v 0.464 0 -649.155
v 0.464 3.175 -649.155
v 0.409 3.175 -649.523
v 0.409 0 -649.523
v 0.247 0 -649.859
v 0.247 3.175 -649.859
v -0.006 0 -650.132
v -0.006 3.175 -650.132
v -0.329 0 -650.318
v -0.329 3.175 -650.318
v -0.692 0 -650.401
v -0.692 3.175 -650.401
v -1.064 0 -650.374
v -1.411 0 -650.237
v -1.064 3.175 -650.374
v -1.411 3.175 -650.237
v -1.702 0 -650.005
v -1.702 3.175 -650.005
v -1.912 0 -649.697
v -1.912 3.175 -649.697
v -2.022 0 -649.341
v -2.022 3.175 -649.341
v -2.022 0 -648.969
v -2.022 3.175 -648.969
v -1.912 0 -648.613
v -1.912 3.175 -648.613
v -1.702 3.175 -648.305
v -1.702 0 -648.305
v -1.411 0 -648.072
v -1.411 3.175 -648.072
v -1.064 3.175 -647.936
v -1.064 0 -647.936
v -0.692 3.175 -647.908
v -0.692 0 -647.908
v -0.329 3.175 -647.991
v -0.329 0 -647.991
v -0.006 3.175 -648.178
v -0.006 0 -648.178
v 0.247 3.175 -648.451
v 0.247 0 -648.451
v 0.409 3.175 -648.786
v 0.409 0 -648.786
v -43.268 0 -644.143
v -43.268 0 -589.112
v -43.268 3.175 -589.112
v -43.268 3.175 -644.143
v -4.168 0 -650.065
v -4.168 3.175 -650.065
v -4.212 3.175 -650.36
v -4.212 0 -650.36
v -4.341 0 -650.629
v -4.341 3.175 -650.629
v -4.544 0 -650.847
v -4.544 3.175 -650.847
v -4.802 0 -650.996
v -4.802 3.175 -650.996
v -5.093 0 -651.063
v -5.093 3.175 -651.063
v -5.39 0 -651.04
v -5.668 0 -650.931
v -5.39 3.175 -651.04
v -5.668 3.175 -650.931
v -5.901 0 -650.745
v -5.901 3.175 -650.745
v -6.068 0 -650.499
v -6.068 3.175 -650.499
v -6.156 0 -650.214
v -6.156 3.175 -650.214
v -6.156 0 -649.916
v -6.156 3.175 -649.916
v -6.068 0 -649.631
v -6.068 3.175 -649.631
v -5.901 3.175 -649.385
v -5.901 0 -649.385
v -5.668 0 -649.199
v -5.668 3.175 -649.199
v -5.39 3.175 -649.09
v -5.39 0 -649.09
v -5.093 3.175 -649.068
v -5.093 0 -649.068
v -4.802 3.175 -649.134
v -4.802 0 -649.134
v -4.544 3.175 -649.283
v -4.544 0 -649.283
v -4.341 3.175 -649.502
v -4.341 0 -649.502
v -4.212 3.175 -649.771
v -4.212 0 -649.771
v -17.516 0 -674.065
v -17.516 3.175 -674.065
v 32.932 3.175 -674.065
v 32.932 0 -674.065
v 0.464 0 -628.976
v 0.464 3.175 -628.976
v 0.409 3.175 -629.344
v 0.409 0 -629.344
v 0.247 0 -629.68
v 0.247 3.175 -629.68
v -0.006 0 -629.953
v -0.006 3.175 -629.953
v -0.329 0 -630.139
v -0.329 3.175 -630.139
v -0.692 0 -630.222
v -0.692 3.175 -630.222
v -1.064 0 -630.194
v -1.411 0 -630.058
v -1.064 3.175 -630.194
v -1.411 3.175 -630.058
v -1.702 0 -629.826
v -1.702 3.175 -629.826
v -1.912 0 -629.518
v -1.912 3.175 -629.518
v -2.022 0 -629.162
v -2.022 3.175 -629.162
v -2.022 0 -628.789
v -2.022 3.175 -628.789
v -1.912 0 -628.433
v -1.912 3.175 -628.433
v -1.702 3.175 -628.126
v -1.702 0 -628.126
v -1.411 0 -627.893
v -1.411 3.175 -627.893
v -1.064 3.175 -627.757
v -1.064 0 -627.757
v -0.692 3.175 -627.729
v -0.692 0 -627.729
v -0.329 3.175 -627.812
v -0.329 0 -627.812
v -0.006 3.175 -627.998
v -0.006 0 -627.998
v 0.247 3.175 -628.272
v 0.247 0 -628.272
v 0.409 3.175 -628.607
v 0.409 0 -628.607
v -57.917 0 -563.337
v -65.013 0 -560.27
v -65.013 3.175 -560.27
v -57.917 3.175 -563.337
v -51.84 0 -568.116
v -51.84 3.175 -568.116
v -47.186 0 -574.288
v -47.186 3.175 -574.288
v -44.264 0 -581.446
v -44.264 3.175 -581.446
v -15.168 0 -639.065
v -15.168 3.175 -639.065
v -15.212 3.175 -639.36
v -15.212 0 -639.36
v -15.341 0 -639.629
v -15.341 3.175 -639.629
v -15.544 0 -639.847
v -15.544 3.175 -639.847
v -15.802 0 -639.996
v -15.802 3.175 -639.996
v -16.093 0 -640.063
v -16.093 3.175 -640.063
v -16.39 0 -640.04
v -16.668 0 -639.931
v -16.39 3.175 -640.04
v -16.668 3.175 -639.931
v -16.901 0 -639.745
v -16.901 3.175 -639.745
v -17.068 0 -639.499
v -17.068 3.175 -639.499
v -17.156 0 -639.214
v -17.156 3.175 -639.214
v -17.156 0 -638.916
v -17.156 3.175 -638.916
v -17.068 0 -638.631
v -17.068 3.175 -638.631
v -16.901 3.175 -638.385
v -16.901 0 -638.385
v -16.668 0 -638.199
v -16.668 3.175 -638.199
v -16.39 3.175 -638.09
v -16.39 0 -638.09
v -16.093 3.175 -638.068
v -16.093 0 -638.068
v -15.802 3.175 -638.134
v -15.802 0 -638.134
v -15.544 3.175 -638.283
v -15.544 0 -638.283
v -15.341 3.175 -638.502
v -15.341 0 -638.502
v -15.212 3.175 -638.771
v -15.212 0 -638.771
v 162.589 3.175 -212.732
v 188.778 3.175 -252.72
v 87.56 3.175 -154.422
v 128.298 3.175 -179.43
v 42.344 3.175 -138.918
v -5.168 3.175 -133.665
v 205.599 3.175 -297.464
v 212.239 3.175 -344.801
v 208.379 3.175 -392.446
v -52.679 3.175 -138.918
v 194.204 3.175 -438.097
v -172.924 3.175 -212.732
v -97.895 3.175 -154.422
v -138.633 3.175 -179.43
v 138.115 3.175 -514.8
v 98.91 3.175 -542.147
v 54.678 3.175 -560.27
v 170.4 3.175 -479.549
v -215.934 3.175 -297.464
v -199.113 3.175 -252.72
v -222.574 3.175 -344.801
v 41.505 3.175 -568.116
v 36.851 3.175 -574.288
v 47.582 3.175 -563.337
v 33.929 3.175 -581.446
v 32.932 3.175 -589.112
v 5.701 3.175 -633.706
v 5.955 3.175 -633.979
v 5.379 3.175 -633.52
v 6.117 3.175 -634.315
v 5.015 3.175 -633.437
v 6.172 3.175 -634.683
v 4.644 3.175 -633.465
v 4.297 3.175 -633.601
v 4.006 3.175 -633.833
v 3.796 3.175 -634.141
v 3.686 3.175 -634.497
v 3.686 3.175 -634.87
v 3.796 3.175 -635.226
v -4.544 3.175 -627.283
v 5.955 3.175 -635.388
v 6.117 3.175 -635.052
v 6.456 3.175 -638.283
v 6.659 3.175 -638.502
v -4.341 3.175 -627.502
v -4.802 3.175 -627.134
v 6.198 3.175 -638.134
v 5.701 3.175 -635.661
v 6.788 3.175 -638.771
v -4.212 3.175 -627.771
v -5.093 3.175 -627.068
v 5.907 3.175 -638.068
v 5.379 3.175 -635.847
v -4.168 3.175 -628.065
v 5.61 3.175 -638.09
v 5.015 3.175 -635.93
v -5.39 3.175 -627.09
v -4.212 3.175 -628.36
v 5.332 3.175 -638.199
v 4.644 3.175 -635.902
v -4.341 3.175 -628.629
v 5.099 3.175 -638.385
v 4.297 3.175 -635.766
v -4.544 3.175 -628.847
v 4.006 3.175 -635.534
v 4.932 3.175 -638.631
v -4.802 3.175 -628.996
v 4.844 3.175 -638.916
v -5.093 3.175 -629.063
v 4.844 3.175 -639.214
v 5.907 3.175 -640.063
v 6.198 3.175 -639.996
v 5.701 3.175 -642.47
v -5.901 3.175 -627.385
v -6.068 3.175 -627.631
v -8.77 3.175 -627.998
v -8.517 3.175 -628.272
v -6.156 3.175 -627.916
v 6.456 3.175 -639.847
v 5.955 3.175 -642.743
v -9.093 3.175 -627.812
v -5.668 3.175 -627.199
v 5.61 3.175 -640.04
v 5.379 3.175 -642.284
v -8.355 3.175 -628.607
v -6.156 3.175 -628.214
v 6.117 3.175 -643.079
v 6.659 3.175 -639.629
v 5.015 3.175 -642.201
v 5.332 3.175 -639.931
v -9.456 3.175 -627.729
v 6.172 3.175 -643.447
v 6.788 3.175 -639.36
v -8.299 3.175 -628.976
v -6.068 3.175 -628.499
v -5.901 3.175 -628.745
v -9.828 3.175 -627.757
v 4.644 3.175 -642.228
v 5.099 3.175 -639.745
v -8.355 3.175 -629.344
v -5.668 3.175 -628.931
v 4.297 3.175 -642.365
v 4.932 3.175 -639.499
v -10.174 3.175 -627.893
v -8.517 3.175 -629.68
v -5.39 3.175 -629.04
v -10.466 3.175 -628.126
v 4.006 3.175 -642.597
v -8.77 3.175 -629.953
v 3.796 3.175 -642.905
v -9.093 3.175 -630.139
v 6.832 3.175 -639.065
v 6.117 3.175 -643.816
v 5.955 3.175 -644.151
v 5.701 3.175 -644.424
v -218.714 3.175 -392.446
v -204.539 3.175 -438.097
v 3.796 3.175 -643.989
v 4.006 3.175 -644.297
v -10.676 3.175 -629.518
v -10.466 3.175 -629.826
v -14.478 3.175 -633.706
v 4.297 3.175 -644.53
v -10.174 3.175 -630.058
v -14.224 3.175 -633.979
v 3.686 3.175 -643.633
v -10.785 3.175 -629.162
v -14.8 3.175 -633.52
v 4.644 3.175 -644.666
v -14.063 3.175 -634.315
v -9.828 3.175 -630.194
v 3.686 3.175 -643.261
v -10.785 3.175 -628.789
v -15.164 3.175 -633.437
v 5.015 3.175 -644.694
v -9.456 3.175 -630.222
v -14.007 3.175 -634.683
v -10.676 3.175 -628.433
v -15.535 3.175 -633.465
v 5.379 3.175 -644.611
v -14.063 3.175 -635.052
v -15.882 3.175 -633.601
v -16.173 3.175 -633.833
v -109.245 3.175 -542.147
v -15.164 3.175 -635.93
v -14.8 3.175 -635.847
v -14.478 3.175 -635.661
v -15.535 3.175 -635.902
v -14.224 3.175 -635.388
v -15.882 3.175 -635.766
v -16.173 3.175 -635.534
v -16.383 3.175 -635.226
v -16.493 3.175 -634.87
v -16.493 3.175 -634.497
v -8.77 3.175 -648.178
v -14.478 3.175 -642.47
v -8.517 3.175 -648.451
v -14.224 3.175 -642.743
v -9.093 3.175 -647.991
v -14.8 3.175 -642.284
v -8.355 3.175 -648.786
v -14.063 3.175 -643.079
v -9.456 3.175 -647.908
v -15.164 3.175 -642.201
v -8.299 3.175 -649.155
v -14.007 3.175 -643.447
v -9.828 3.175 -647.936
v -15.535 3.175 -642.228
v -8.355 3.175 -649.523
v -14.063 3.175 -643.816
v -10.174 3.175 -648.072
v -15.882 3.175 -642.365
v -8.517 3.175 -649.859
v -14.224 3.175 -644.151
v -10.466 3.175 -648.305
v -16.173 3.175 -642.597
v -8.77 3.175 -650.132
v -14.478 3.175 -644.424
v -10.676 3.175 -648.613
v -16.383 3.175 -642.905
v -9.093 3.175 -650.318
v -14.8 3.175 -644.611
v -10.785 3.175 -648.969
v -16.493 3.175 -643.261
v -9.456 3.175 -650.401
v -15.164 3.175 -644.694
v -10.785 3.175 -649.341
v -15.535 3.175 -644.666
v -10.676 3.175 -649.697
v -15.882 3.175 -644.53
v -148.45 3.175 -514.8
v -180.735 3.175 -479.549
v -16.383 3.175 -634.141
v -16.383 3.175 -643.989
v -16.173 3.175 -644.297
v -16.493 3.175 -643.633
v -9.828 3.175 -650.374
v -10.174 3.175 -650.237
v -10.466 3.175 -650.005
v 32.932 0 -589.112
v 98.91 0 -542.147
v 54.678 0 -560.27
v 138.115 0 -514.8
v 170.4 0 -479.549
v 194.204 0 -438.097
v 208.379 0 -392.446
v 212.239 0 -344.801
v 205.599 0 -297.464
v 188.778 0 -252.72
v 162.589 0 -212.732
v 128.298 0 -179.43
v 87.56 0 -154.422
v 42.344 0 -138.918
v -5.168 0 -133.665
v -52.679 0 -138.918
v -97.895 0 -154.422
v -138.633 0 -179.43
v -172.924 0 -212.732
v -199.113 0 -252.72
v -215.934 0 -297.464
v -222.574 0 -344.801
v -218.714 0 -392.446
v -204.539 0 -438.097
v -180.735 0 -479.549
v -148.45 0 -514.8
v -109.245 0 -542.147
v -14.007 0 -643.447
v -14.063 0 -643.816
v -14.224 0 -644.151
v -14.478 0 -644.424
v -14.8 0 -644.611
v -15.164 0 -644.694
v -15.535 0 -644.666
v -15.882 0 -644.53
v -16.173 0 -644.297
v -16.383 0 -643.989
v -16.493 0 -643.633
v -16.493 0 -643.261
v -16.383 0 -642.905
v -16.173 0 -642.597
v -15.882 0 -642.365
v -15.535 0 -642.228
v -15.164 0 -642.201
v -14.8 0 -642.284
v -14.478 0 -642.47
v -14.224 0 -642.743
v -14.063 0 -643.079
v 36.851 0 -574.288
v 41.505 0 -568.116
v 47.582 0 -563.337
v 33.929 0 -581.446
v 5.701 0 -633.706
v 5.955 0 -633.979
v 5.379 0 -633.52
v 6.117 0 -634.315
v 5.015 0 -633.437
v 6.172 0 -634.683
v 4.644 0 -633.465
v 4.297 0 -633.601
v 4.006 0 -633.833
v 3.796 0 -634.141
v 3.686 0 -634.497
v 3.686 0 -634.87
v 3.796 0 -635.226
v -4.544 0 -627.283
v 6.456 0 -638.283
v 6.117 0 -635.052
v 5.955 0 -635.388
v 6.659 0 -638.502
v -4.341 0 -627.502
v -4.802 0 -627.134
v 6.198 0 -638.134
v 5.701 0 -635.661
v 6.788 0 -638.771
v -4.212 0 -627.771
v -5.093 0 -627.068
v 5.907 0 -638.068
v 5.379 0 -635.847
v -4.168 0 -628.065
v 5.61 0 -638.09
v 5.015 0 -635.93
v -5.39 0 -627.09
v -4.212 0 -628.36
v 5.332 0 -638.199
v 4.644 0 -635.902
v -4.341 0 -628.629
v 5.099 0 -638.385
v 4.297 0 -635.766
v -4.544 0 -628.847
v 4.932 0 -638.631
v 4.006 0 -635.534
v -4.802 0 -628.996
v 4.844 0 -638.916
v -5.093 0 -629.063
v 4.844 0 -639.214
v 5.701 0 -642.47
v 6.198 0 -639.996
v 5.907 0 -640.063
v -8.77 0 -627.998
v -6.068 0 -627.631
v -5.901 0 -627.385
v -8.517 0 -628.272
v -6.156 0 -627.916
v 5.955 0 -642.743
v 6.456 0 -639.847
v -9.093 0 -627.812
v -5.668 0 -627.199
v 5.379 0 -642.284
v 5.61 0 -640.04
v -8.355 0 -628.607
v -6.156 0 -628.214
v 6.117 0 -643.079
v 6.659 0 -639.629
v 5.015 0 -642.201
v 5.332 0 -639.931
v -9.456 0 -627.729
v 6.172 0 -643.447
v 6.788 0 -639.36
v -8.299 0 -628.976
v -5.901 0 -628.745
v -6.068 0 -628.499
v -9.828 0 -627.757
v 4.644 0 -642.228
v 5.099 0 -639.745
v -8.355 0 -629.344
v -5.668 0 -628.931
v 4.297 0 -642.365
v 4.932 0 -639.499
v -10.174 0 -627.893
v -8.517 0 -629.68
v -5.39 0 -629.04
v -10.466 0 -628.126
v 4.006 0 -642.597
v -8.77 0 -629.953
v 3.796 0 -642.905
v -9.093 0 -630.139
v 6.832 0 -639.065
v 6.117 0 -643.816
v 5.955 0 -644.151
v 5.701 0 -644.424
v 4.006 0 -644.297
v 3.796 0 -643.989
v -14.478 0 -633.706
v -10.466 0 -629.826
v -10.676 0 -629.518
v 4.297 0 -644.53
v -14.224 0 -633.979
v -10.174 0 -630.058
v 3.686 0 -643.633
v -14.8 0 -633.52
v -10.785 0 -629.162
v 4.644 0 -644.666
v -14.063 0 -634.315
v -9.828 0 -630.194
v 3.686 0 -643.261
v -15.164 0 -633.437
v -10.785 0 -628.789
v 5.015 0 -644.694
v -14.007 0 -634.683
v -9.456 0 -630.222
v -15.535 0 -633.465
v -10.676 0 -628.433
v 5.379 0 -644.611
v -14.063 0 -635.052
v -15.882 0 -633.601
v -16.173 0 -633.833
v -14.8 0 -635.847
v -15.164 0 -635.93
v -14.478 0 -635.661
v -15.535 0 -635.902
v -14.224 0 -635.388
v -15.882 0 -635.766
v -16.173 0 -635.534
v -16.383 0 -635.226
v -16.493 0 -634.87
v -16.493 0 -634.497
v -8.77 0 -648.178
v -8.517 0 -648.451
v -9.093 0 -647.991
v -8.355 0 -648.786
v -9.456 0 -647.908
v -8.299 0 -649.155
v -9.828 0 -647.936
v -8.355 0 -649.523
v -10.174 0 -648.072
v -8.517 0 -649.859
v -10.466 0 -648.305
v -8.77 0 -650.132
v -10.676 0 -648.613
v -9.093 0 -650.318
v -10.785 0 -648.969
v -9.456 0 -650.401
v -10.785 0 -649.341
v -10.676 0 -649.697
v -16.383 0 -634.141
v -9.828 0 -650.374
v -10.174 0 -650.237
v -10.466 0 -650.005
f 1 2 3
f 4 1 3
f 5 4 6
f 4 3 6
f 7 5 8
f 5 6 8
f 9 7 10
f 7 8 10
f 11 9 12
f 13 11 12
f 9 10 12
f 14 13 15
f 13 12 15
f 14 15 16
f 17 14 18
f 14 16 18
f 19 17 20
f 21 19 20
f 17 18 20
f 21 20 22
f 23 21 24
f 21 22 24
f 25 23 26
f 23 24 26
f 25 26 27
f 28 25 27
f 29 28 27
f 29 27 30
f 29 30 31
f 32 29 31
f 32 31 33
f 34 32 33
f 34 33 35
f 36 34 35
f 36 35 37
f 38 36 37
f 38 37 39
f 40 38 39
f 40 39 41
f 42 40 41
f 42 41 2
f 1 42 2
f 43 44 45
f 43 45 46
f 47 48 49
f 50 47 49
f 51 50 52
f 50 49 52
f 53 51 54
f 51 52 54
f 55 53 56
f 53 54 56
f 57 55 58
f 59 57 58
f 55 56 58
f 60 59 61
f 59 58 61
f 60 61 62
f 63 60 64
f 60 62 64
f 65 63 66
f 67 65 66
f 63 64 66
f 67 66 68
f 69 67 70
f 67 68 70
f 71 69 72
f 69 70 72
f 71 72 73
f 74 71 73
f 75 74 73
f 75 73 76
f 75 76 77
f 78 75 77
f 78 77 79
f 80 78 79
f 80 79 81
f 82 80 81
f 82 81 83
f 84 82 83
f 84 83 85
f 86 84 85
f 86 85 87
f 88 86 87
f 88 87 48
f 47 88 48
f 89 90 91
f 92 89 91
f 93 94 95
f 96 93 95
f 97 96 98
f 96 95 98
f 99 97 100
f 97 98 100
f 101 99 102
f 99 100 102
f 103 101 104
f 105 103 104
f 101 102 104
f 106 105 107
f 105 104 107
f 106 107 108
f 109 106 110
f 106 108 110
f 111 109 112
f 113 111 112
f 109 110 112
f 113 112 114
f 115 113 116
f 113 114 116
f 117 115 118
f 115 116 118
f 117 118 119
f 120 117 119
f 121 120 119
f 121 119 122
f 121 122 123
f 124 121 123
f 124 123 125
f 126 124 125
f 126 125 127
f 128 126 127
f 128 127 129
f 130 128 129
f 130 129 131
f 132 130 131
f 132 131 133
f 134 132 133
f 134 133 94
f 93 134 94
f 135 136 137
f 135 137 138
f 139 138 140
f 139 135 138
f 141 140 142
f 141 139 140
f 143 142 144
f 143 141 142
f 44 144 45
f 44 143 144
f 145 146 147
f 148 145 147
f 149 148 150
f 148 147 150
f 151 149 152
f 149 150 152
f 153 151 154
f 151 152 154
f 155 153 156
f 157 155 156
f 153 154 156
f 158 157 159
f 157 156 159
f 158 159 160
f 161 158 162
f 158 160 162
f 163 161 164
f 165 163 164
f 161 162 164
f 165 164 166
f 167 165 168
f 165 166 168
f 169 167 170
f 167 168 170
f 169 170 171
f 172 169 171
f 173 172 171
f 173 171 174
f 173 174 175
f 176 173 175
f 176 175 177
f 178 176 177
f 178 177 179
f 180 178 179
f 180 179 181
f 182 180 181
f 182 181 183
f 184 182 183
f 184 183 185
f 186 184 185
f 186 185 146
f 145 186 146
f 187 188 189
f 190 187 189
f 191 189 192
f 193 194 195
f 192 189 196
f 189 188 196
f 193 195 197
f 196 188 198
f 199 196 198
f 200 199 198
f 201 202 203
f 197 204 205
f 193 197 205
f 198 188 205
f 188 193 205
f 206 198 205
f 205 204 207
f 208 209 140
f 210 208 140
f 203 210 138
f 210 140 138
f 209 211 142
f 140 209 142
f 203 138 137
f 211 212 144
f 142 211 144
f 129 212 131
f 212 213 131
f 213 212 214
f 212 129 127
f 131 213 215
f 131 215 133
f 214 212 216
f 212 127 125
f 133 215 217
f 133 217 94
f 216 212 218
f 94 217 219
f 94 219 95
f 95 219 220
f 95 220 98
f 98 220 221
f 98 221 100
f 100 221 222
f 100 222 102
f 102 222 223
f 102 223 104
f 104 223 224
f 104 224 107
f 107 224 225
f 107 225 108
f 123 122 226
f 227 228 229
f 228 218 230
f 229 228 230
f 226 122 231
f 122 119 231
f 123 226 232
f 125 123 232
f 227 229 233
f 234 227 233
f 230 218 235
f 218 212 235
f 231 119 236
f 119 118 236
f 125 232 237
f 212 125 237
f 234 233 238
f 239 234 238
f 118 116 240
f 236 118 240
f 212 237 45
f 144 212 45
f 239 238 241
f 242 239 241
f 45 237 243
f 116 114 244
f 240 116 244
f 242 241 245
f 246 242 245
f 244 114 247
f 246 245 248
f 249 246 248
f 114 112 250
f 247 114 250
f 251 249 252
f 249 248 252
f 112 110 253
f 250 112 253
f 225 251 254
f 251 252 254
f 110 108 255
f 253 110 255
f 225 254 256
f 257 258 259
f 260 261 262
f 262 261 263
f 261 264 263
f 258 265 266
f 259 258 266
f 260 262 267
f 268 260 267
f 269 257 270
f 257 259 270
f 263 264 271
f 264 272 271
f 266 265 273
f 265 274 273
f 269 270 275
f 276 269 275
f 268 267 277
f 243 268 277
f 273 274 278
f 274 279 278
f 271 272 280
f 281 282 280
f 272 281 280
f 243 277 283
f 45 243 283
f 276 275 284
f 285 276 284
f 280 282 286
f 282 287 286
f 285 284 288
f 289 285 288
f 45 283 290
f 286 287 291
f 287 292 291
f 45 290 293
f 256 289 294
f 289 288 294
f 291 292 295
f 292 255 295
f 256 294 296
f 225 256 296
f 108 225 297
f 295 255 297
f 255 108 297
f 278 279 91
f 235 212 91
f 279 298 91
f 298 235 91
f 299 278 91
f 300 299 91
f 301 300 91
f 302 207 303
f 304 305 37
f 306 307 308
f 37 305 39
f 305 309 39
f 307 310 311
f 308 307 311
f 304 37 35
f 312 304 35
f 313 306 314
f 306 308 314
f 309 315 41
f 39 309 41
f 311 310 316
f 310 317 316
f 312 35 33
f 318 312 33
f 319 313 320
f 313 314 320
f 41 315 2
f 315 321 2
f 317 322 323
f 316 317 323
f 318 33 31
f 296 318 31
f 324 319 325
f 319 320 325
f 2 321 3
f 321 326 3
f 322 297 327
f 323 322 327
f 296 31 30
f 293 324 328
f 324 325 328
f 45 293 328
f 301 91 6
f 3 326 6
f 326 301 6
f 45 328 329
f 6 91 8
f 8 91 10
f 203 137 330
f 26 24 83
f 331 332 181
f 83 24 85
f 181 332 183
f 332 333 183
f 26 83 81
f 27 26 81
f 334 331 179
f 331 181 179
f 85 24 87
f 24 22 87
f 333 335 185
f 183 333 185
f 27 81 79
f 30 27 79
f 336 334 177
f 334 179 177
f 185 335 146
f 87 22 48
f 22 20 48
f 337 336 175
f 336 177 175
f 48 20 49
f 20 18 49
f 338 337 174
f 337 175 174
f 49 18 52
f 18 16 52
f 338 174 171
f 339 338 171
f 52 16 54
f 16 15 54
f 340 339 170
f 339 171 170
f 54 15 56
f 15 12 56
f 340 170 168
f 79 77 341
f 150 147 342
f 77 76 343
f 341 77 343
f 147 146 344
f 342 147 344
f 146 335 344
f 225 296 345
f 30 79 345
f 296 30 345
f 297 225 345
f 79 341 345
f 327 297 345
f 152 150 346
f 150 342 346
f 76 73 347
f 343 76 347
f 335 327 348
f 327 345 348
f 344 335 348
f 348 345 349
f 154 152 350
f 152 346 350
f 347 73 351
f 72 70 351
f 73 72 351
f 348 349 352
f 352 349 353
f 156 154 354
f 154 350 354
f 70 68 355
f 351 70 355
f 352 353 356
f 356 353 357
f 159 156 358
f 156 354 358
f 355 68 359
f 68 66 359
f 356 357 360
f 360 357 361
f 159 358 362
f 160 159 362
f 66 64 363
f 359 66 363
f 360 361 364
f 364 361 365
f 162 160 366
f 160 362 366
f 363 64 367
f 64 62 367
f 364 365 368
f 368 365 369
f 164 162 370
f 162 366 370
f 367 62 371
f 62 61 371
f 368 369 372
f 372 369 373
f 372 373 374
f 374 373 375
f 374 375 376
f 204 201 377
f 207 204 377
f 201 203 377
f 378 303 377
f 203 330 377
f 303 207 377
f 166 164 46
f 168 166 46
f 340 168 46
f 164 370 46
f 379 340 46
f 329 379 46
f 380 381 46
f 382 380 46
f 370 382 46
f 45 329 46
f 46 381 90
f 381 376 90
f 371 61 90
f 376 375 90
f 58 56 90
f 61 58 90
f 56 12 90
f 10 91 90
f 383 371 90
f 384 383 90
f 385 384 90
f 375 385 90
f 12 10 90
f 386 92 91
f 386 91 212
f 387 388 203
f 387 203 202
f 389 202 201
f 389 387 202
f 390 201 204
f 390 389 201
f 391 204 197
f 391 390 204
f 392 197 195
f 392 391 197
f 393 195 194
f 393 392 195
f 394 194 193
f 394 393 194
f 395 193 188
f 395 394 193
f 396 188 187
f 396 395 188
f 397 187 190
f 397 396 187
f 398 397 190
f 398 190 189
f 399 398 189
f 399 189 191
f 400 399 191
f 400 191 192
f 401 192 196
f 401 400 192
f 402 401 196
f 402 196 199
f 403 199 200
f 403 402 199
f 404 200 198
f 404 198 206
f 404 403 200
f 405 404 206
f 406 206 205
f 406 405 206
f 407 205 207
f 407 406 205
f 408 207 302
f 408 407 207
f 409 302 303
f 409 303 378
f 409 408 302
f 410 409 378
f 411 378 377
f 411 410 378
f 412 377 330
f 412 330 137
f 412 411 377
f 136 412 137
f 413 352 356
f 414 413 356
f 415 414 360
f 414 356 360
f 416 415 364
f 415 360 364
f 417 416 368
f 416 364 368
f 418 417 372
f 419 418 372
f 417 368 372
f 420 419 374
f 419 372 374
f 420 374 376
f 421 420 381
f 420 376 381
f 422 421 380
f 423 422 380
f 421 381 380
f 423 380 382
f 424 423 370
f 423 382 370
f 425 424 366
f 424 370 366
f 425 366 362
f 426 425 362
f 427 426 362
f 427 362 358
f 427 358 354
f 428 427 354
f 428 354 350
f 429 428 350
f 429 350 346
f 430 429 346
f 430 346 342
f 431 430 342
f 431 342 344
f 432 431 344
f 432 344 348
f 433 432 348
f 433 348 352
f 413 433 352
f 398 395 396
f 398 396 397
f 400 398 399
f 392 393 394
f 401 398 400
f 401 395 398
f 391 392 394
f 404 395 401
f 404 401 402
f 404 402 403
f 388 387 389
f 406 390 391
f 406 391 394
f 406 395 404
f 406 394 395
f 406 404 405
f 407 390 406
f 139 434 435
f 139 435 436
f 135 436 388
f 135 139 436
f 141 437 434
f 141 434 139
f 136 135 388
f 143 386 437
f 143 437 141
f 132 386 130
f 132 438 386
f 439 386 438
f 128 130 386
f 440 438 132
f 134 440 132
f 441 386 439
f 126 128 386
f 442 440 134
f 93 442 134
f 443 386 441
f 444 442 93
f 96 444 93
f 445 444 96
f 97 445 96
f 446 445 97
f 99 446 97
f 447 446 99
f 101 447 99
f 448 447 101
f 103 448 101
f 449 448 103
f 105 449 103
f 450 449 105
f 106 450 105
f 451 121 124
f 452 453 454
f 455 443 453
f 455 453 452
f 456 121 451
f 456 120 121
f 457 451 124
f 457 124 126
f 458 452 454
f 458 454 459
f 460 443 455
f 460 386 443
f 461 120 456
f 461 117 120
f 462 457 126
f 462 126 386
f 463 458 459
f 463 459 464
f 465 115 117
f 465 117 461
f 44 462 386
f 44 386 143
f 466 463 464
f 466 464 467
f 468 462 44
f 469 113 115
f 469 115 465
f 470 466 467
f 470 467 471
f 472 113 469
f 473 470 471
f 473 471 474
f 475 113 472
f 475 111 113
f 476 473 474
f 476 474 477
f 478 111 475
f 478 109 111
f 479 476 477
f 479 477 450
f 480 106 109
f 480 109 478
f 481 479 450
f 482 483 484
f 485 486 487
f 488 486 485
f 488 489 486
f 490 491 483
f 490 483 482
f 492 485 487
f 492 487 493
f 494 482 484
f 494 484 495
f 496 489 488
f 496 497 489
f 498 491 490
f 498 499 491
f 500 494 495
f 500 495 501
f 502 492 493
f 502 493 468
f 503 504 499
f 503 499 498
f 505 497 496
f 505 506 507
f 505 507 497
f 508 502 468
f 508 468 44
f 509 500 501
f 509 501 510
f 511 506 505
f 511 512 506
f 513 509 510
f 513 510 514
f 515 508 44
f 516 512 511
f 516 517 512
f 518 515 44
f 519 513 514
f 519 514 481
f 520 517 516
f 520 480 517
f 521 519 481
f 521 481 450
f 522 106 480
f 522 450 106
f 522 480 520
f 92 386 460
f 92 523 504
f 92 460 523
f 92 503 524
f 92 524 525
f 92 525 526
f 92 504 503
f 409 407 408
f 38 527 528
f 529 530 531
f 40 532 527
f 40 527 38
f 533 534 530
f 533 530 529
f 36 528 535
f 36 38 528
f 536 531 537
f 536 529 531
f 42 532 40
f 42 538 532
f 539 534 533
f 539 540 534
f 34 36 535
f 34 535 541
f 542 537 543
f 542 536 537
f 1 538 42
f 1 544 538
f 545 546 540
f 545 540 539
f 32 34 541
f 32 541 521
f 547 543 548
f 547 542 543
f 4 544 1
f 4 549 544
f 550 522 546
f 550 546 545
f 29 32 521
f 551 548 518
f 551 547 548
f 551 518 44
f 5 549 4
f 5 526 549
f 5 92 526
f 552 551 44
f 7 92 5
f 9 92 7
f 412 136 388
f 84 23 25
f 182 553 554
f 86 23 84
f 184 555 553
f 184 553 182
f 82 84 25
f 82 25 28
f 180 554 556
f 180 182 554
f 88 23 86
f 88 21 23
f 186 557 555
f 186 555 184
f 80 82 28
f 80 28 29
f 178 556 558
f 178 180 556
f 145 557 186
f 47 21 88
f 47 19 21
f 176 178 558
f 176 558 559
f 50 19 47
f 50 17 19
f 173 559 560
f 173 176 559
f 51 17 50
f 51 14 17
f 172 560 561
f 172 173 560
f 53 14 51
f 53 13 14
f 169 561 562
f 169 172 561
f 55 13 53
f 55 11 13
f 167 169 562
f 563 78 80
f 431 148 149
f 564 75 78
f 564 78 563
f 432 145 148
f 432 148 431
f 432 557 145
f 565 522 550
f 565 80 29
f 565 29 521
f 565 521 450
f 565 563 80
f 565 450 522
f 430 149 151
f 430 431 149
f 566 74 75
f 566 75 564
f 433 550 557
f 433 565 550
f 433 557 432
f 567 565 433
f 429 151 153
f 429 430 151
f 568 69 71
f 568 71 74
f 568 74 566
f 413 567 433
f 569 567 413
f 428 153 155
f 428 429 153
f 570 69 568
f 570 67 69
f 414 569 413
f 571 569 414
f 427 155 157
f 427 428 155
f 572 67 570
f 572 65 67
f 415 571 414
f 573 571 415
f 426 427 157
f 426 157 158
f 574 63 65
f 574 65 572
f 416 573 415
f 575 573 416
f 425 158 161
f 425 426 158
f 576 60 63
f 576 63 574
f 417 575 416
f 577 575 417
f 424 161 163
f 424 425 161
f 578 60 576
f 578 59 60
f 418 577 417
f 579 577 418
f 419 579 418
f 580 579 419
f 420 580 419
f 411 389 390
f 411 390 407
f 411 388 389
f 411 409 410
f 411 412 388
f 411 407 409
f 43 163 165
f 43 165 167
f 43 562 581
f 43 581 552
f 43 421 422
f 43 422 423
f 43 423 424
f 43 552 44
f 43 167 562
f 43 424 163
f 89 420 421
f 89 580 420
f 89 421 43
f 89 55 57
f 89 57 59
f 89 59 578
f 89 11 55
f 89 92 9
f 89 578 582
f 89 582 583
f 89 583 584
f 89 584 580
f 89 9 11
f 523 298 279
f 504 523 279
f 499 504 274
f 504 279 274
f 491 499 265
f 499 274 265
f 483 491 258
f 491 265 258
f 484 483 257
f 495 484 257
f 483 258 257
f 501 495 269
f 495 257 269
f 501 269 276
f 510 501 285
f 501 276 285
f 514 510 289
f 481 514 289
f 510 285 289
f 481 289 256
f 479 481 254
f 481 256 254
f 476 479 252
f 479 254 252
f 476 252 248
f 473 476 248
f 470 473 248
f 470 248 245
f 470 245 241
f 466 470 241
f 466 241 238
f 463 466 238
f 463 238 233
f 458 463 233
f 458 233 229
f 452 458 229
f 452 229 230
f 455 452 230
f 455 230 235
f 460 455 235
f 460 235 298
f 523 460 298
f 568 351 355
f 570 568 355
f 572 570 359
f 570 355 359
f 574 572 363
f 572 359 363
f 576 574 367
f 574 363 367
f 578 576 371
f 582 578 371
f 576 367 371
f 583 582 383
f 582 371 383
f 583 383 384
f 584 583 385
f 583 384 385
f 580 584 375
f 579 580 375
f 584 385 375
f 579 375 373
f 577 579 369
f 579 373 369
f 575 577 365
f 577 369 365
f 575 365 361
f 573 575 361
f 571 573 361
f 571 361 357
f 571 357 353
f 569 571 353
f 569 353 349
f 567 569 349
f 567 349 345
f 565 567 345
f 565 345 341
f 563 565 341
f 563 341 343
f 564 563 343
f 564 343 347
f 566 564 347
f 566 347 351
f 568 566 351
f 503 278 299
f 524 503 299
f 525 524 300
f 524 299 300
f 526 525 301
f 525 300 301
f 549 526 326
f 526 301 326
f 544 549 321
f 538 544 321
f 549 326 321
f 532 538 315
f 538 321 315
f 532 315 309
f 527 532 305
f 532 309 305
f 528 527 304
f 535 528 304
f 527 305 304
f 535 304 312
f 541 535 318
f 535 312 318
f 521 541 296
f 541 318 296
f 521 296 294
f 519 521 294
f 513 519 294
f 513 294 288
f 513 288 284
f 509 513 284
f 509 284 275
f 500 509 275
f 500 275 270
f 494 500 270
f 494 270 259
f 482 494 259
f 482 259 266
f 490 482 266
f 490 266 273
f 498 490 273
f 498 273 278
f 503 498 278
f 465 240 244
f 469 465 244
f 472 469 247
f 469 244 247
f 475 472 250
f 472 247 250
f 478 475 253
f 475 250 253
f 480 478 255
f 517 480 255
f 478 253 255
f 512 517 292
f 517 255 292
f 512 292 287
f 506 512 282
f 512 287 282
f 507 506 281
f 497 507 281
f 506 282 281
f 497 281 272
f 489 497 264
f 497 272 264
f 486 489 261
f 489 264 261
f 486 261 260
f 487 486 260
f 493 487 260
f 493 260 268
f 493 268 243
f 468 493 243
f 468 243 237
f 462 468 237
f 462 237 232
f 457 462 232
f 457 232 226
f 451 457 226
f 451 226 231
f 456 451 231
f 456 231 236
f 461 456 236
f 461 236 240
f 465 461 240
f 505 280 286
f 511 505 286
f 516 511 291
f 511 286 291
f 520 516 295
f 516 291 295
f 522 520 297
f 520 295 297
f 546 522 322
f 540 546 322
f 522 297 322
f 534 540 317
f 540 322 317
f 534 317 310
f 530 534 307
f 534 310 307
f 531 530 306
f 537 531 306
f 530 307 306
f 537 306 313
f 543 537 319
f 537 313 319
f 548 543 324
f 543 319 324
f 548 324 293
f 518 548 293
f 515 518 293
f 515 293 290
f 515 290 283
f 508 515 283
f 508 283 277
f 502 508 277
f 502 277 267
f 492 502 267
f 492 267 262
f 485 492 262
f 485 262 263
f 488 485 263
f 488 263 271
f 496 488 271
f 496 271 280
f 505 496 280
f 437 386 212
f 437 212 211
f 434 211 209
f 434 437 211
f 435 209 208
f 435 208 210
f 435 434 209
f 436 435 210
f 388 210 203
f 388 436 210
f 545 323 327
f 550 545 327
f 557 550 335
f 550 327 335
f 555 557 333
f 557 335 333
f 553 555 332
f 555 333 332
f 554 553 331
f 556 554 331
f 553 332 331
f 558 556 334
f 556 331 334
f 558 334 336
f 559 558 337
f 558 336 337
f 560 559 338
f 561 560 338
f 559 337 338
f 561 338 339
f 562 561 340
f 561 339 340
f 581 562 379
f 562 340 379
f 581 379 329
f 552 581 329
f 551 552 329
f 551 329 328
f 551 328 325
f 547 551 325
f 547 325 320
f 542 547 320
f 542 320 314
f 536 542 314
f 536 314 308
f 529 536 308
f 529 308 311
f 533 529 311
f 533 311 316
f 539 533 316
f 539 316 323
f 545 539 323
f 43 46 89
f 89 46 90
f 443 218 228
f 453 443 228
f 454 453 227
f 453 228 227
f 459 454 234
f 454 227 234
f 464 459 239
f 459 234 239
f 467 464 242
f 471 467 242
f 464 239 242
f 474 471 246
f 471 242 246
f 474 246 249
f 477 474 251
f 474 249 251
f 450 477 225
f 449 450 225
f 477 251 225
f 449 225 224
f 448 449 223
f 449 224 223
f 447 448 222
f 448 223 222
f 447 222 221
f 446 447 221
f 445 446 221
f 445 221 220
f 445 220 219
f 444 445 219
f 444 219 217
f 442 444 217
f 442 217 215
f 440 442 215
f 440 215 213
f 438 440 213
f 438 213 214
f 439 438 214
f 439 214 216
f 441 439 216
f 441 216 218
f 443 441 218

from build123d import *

# Parameters (mm, degrees)
BOSS_EXTRUDE1_DEPTH = 3.175
SKETCH20_R          = 1.25
SKETCH20_R_2        = 1
CUT_EXTRUDE1_DEPTH  = 4.175
CUT_EXTRUDE2_DEPTH  = 4.175


with BuildPart() as part:
    # Sketch1 → Boss-Extrude1 (new body)
    with BuildSketch(Plane(origin=(-1.297967049, 0, -318.957650502), x_dir=(1, 0, 0), z_dir=(0, 1, 0))):
        with BuildLine():
            Line((-41.969554108, 375.107652622), (34.230445892, 375.107652622))
            Line((34.230445892, 375.107652622), (34.230445892, 270.154369347))
            ThreePointArc((34.230445892, 270.154369347), (40.275943564, 252.093864975), (55.975900438, 241.312343077))
            ThreePointArc((55.975900438, 241.312343077), (-3.869554108, -185.292347378), (-63.715008653, 241.312343077))
            ThreePointArc((-63.715008653, 241.312343077), (-48.015051779, 252.093864975), (-41.969554108, 270.154369347))
            Line((-41.969554108, 270.154369347), (-41.969554108, 375.107652622))
        make_face()
    extrude(amount=BOSS_EXTRUDE1_DEPTH)

    # Sketch20 → Cut-Extrude1 (cut, through all)
    with BuildSketch(Plane(origin=(0, 3.175, 0), x_dir=(1, 0, 0), z_dir=(0, 1, 0))):
        with Locations((-15.257093255, 634.683461631)):
            Circle(SKETCH20_R)
        with Locations((-16.167521157, 639.065303124)):
            Circle(SKETCH20_R_2)
        with Locations((-15.257093255, 643.447144618)):
            Circle(SKETCH20_R)
        with Locations((-5.167521157, 628.065303124)):
            Circle(SKETCH20_R_2)
        with Locations((-9.549362651, 628.975731026)):
            Circle(SKETCH20_R)
        with Locations((-0.785679663, 628.975731026)):
            Circle(SKETCH20_R)
        with Locations((-9.549362651, 649.154875222)):
            Circle(SKETCH20_R)
        with Locations((-5.167521157, 650.065303124)):
            Circle(SKETCH20_R_2)
        with Locations((-0.785679663, 649.154875222)):
            Circle(SKETCH20_R)
        with Locations((4.922050941, 643.447144618)):
            Circle(SKETCH20_R)
        with Locations((5.832478843, 639.065303124)):
            Circle(SKETCH20_R_2)
        with Locations((4.922050941, 634.683461631)):
            Circle(SKETCH20_R)
    extrude(amount=-CUT_EXTRUDE1_DEPTH, mode=Mode.SUBTRACT)

    # Sketch21 → Cut-Extrude2 (cut, through all)
    with BuildSketch(Plane(origin=(0, 3.175, 0), x_dir=(1, 0, 0), z_dir=(0, 1, 0))):
        Polygon((32.932478843, 694.065303124), (-43.267521157, 694.065303124), (-43.267521157, 674.065303124), (-43.267521157, 644.143456202), (-17.515896333, 674.065303124), (32.932478843, 674.065303124), align=None)
    extrude(amount=-CUT_EXTRUDE2_DEPTH, mode=Mode.SUBTRACT)


solid = part.part
